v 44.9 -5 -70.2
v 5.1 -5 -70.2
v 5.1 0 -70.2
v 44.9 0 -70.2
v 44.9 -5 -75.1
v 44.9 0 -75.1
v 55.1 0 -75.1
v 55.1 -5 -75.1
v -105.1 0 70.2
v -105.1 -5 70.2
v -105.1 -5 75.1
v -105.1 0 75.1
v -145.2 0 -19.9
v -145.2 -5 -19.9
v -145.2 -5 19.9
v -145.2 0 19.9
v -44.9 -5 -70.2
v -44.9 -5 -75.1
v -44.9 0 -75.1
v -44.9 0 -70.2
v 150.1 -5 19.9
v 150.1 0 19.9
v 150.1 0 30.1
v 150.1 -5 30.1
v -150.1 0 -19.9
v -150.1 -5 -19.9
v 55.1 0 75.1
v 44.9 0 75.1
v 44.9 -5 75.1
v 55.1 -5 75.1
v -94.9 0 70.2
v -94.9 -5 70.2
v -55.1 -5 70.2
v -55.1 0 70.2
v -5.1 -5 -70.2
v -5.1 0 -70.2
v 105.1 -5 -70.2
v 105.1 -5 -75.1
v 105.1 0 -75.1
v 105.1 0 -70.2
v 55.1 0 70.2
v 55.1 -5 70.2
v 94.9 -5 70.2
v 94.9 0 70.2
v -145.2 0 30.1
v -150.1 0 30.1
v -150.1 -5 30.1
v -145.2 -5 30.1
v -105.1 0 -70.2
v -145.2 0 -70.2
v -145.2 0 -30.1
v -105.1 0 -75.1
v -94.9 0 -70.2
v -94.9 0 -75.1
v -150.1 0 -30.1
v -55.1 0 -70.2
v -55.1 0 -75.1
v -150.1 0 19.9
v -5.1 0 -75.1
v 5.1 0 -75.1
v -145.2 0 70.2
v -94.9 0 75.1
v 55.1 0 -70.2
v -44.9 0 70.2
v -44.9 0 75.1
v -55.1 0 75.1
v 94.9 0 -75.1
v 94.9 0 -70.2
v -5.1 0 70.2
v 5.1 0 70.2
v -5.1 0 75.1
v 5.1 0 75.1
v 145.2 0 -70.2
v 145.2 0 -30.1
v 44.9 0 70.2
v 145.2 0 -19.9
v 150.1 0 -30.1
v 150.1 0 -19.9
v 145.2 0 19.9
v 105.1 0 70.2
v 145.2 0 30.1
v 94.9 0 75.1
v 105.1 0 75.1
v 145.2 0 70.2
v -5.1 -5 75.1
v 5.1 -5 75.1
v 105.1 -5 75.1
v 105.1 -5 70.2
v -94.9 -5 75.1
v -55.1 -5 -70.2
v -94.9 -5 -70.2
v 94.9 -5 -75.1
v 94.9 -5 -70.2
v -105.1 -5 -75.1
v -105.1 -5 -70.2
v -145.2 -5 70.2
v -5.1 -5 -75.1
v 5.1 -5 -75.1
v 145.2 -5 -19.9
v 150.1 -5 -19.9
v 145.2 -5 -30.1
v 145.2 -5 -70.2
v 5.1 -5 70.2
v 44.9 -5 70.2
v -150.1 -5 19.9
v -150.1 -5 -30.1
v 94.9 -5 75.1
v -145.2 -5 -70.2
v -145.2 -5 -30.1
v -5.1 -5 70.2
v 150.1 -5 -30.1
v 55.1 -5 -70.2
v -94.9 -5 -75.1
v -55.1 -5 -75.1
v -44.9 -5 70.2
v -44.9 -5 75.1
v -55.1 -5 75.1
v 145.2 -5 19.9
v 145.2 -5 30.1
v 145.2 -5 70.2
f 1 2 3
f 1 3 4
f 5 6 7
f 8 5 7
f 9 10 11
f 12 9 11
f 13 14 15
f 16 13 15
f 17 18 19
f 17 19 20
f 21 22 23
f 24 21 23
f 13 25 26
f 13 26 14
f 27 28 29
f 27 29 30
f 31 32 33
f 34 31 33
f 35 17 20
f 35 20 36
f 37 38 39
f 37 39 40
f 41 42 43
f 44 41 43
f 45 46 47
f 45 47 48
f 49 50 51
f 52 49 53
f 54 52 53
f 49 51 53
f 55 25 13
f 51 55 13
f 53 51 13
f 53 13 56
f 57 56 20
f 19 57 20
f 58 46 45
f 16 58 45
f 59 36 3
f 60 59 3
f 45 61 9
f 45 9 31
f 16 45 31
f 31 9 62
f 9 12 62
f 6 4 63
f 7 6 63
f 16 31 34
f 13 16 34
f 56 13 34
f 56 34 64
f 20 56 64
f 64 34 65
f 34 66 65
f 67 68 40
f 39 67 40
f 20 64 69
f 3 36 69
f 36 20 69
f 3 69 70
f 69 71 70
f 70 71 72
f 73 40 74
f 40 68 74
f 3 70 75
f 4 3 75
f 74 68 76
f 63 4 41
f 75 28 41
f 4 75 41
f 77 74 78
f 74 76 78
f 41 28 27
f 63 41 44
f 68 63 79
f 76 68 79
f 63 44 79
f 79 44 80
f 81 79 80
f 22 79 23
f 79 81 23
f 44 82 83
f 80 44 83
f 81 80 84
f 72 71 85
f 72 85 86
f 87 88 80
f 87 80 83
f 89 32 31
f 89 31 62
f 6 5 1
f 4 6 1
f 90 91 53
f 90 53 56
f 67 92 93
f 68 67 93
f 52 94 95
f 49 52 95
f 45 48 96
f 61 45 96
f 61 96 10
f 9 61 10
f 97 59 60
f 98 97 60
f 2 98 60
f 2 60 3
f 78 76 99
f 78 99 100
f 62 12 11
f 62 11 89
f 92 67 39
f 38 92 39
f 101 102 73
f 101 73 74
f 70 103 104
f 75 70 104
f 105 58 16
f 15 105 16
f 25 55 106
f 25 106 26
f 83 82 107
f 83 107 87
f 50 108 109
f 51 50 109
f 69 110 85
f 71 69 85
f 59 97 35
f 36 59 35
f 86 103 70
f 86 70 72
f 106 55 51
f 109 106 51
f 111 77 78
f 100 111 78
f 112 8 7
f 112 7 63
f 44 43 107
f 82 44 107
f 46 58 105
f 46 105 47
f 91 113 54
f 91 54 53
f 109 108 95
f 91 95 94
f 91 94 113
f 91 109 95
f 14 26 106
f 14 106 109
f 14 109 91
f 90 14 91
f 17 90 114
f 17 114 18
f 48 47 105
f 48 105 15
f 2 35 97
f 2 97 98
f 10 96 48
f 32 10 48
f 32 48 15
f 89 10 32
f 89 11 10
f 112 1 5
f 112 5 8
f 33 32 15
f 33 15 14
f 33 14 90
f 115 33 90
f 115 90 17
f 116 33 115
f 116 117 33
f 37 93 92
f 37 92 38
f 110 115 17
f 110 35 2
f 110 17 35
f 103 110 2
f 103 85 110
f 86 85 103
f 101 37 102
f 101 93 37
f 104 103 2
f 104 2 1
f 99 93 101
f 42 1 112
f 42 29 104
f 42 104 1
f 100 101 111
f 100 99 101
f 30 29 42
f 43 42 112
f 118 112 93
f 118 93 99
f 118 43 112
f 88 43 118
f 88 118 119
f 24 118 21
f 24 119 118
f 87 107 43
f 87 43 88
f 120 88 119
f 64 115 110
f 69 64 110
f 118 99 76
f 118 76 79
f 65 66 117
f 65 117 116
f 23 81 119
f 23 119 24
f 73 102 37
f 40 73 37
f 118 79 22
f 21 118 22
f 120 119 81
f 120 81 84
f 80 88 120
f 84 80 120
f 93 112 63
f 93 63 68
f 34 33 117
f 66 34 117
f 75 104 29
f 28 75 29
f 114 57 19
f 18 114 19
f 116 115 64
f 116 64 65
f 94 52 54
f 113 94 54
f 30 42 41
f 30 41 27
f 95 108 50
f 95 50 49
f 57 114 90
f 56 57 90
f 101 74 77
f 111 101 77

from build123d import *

# Parameters (mm, degrees)
F0_W     = 300.2
F0_H     = 150.2
F1_DEPTH = 5
F2_W     = 4.9
F2_H     = 4.9
F2_W_2   = 40.1
F2_H_2   = 40.1
F2_H_3   = 39.8
F2_W_3   = 39.8
F3_DEPTH = 5


with BuildPart() as f1:
    # F0 (on Front) → F1 (new body)
    with BuildSketch(Plane.XZ):
        Rectangle(F0_W, F0_H)
    extrude(amount=F1_DEPTH)

    # F2 (on face) → F3 (cut, through all)
    with BuildSketch(Plane.XZ.offset(5)):
        with Locations((-147.65, 72.65)):
            Rectangle(F2_W, F2_H)
        with Locations((-125.15, 72.65)):
            Rectangle(F2_W_2, F2_H)
        with Locations((-147.65, 50.15)):
            Rectangle(F2_W, F2_H_2)
        with Locations((-147.65, 0)):
            Rectangle(F2_W, F2_H_3)
        with Locations((-147.65, -50.15)):
            Rectangle(F2_W, F2_H_2)
        with Locations((-147.65, -72.65)):
            Rectangle(F2_W, F2_H)
        with Locations((-125.15, -72.65)):
            Rectangle(F2_W_2, F2_H)
        with Locations((-75, 72.65)):
            Rectangle(F2_W_3, F2_H)
        with Locations((-25, 72.65)):
            Rectangle(F2_W_3, F2_H)
        with Locations((25, 72.65)):
            Rectangle(F2_W_3, F2_H)
        with Locations((75, 72.65)):
            Rectangle(F2_W_3, F2_H)
        with Locations((147.65, 72.65)):
            Rectangle(F2_W, F2_H)
        with Locations((125.15, 72.65)):
            Rectangle(F2_W_2, F2_H)
        with Locations((147.65, 50.15)):
            Rectangle(F2_W, F2_H_2)
        with Locations((25, -72.65)):
            Rectangle(F2_W_3, F2_H)
        with Locations((-25, -72.65)):
            Rectangle(F2_W_3, F2_H)
        with Locations((-75, -72.65)):
            Rectangle(F2_W_3, F2_H)
        with Locations((125.15, -72.65)):
            Rectangle(F2_W_2, F2_H)
        with Locations((147.65, -72.65)):
            Rectangle(F2_W, F2_H)
        with Locations((147.65, -50.15)):
            Rectangle(F2_W, F2_H_2)
        with Locations((75, -72.65)):
            Rectangle(F2_W_3, F2_H)
        with Locations((147.65, 0)):
            Rectangle(F2_W, F2_H_3)
    extrude(amount=-F3_DEPTH, mode=Mode.SUBTRACT)


solid = f1.part
